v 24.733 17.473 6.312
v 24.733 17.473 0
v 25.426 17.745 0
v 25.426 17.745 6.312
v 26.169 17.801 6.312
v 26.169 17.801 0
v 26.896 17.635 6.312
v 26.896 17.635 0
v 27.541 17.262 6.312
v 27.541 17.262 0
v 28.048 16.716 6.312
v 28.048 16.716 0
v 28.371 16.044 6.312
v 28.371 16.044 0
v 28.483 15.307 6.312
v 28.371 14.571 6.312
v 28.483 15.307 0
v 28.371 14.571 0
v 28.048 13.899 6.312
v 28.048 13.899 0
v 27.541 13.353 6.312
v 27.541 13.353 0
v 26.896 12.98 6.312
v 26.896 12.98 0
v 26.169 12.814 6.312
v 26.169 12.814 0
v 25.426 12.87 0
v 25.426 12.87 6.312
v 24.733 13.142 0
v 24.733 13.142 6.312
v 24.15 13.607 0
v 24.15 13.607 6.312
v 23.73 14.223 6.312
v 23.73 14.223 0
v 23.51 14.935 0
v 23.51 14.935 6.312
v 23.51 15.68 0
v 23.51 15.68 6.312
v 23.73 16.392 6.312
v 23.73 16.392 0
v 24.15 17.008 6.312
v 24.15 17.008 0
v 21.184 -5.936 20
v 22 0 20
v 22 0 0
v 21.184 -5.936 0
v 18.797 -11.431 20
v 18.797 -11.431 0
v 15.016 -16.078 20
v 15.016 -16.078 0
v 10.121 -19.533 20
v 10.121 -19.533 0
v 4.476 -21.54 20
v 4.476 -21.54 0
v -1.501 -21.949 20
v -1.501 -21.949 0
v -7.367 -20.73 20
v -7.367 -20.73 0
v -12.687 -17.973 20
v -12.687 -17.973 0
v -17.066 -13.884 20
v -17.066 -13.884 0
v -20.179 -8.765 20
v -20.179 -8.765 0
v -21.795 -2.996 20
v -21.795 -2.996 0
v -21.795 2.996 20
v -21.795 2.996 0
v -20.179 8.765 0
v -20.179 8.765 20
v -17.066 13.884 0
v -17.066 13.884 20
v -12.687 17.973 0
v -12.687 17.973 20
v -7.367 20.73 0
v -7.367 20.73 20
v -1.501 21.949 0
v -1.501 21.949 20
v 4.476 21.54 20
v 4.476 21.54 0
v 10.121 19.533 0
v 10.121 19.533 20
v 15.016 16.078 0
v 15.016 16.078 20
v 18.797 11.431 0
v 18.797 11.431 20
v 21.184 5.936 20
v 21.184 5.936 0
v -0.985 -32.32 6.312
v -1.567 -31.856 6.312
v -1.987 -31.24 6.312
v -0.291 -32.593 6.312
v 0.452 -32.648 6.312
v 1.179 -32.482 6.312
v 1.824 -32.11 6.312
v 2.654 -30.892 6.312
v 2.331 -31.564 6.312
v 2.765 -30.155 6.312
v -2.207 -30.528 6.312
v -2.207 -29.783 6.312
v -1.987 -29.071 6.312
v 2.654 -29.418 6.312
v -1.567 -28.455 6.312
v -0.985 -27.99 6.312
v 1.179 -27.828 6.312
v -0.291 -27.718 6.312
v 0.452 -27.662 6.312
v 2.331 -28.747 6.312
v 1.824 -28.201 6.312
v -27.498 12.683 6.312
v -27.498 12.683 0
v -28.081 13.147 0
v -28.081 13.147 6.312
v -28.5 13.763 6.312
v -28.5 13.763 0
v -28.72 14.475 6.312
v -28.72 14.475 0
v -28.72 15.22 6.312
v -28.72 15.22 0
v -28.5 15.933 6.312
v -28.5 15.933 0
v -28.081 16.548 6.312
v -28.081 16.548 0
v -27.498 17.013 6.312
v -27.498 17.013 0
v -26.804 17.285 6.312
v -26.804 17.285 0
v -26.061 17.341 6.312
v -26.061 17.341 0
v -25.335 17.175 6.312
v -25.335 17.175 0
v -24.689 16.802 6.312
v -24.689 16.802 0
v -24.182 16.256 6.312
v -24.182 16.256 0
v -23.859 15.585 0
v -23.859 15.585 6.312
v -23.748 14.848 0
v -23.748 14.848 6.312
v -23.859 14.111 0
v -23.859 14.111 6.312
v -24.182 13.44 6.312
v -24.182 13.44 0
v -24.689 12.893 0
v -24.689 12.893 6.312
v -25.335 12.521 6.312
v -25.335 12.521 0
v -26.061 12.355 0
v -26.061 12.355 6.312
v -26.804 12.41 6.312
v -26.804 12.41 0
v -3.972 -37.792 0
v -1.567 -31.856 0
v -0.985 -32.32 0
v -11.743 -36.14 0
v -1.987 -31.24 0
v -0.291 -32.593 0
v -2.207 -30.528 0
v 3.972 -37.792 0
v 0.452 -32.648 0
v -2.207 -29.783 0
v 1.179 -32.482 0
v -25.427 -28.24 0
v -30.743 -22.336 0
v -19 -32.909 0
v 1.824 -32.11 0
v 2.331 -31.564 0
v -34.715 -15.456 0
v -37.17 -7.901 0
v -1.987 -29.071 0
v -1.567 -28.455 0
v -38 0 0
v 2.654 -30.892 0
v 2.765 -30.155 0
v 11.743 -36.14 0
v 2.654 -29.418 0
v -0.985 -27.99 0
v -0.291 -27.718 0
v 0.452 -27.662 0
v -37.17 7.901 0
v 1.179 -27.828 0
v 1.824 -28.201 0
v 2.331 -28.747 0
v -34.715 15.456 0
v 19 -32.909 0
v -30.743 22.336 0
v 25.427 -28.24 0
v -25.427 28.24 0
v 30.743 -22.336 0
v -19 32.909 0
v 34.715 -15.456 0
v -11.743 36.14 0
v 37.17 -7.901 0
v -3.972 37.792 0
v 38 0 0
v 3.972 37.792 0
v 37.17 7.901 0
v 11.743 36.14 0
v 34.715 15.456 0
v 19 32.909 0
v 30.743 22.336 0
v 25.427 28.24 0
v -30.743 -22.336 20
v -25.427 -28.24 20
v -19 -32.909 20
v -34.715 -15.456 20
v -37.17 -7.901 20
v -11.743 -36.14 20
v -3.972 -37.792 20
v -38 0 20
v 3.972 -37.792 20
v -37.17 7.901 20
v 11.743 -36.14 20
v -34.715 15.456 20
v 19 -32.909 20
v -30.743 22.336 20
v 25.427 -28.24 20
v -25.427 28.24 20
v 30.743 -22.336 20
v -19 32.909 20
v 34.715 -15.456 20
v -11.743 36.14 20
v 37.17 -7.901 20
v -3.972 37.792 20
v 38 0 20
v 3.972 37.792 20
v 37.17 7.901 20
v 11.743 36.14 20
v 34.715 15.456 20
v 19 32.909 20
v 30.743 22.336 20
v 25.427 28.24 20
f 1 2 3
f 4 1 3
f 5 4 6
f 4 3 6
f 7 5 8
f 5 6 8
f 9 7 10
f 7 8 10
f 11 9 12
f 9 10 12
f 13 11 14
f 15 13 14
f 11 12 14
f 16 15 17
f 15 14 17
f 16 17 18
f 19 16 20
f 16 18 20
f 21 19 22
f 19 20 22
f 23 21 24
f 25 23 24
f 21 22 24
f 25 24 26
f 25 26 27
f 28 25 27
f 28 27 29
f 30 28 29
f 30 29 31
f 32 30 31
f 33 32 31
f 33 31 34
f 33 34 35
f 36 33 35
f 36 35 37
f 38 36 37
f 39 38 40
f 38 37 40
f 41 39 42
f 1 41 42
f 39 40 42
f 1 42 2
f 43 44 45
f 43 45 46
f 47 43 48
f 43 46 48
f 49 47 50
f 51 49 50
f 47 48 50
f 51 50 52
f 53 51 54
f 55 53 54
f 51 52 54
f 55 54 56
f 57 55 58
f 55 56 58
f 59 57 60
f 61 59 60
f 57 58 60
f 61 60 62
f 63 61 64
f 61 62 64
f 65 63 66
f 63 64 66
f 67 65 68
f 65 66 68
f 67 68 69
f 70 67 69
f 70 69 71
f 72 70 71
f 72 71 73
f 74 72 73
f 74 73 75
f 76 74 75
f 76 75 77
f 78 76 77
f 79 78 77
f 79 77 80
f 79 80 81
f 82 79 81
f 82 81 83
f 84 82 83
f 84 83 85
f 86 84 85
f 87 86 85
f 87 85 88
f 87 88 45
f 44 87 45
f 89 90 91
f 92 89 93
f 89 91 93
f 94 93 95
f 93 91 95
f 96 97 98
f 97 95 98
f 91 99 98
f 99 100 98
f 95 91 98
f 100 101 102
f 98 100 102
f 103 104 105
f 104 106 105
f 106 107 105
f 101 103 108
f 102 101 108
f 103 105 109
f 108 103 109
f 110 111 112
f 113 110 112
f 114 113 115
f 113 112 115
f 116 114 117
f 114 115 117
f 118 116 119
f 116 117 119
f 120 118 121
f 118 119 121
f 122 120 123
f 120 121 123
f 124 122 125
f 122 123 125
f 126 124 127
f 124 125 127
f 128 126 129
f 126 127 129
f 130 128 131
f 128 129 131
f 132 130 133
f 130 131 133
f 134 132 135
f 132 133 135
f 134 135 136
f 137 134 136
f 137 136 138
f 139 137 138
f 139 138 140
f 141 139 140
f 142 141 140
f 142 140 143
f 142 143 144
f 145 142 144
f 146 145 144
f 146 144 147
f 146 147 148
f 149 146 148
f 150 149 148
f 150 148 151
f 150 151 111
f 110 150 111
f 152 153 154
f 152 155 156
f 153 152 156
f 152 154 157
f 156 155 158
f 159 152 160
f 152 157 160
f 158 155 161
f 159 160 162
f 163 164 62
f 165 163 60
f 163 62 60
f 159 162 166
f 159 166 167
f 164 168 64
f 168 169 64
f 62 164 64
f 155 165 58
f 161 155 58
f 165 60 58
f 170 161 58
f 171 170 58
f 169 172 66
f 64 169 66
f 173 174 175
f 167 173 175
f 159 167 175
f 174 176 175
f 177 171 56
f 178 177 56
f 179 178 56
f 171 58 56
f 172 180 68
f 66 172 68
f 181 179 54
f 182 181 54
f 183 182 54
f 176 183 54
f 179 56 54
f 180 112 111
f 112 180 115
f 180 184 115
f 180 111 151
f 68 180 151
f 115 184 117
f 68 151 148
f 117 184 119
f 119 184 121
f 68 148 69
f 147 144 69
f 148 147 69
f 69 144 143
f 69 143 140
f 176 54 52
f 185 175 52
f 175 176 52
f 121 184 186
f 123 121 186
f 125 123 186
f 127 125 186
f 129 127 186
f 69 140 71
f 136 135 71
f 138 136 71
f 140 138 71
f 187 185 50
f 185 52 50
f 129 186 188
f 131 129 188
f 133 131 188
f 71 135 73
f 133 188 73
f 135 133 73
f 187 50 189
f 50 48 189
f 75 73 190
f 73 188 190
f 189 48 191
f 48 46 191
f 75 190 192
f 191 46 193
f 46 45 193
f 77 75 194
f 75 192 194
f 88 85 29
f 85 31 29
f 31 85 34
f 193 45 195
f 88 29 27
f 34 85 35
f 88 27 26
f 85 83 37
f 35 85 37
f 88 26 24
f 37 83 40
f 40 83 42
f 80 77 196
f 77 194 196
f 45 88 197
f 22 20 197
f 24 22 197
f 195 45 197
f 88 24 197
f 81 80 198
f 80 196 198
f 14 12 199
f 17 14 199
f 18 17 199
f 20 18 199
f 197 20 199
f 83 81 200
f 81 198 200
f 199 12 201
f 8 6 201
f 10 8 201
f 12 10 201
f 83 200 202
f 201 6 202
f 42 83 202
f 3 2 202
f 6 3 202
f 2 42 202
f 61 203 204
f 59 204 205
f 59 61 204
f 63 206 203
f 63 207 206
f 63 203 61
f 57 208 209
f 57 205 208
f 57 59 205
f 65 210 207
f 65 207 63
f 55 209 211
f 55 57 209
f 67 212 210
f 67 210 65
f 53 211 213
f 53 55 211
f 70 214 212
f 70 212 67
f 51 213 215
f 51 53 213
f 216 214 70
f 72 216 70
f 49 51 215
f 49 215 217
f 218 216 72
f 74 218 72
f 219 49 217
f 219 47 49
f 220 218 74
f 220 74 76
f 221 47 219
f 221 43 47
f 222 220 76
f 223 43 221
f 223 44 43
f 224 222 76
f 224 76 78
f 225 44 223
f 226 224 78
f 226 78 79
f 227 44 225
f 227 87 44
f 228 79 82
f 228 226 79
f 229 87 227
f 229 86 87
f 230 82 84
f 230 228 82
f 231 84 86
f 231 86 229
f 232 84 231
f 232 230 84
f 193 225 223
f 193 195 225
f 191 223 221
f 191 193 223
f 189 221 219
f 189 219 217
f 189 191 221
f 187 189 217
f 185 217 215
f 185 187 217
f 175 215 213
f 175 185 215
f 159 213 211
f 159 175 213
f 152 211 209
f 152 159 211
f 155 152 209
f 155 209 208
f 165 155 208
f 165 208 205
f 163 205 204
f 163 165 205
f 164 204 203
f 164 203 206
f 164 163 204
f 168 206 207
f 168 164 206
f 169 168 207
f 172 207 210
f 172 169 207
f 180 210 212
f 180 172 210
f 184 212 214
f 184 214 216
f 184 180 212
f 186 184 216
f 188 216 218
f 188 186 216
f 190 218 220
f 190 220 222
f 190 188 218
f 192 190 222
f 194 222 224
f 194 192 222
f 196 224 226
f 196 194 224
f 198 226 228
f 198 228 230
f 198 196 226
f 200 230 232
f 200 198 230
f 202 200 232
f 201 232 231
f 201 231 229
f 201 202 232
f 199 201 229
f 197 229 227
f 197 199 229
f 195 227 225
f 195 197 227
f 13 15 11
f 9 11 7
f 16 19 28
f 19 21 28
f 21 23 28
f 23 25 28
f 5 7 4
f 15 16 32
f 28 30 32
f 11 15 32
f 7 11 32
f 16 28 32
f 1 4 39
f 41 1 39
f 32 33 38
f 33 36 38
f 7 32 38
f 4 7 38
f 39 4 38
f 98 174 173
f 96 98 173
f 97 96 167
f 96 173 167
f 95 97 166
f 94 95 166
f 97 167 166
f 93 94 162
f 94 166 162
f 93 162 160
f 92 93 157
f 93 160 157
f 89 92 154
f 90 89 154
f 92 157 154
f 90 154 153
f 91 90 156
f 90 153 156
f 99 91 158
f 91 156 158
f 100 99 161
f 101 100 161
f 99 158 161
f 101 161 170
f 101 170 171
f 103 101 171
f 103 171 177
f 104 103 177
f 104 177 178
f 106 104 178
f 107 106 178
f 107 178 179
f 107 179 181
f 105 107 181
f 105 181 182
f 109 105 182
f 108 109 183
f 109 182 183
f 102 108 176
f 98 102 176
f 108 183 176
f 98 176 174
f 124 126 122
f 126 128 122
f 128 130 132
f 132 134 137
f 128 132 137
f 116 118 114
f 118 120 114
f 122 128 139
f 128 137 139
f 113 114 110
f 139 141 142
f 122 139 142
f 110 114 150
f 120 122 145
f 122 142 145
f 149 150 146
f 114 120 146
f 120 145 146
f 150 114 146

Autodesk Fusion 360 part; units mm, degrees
sketch "Sketch1" plane through (0, 0, 0) normal (0, 0, 1) x (1, 0, 0)
  circle A0 centre (0, 0) radius 19.3
  circle A1 centre (0, 0) radius 22.5
  circle A2 centre (0, 0) radius 38
  dimension "d1" = 45
  dimension "d2" = 38.6
  dimension "d3" = 76
extrude "Extrude1" add sketch "Sketch1" along normal blind 20 contours A1
sketch "Sketch2" plane through (0, 0, 0) normal (0, 0, 1) x (1, 0, 0)
  circle A0 centre (0.2654, -30.1553) radius 2.5
  dimension "d8" = 5
extrude "Extrude4" add sketch "Sketch1" along normal blind 20 contours A1 | A2
extrude "Extrude5" cut sketch "Sketch2" along normal blind 6.312
pattern_circular "C-Pattern2" count 3 over 360 about axis through (0, 0, 20) along (0, 0, 1) of "Extrude5"
move_face "면 간격띄우기1" offset 5 1 faces at (19.276, -0.962, 13.3333)
move_face "면 간격띄우기2" offset 2.3 1 faces at (14.2822, 0.7128, 6.6667)
move_face "면 간격띄우기3" offset -10 1 faces at (11.9851, 0.5982, 6.6667)
